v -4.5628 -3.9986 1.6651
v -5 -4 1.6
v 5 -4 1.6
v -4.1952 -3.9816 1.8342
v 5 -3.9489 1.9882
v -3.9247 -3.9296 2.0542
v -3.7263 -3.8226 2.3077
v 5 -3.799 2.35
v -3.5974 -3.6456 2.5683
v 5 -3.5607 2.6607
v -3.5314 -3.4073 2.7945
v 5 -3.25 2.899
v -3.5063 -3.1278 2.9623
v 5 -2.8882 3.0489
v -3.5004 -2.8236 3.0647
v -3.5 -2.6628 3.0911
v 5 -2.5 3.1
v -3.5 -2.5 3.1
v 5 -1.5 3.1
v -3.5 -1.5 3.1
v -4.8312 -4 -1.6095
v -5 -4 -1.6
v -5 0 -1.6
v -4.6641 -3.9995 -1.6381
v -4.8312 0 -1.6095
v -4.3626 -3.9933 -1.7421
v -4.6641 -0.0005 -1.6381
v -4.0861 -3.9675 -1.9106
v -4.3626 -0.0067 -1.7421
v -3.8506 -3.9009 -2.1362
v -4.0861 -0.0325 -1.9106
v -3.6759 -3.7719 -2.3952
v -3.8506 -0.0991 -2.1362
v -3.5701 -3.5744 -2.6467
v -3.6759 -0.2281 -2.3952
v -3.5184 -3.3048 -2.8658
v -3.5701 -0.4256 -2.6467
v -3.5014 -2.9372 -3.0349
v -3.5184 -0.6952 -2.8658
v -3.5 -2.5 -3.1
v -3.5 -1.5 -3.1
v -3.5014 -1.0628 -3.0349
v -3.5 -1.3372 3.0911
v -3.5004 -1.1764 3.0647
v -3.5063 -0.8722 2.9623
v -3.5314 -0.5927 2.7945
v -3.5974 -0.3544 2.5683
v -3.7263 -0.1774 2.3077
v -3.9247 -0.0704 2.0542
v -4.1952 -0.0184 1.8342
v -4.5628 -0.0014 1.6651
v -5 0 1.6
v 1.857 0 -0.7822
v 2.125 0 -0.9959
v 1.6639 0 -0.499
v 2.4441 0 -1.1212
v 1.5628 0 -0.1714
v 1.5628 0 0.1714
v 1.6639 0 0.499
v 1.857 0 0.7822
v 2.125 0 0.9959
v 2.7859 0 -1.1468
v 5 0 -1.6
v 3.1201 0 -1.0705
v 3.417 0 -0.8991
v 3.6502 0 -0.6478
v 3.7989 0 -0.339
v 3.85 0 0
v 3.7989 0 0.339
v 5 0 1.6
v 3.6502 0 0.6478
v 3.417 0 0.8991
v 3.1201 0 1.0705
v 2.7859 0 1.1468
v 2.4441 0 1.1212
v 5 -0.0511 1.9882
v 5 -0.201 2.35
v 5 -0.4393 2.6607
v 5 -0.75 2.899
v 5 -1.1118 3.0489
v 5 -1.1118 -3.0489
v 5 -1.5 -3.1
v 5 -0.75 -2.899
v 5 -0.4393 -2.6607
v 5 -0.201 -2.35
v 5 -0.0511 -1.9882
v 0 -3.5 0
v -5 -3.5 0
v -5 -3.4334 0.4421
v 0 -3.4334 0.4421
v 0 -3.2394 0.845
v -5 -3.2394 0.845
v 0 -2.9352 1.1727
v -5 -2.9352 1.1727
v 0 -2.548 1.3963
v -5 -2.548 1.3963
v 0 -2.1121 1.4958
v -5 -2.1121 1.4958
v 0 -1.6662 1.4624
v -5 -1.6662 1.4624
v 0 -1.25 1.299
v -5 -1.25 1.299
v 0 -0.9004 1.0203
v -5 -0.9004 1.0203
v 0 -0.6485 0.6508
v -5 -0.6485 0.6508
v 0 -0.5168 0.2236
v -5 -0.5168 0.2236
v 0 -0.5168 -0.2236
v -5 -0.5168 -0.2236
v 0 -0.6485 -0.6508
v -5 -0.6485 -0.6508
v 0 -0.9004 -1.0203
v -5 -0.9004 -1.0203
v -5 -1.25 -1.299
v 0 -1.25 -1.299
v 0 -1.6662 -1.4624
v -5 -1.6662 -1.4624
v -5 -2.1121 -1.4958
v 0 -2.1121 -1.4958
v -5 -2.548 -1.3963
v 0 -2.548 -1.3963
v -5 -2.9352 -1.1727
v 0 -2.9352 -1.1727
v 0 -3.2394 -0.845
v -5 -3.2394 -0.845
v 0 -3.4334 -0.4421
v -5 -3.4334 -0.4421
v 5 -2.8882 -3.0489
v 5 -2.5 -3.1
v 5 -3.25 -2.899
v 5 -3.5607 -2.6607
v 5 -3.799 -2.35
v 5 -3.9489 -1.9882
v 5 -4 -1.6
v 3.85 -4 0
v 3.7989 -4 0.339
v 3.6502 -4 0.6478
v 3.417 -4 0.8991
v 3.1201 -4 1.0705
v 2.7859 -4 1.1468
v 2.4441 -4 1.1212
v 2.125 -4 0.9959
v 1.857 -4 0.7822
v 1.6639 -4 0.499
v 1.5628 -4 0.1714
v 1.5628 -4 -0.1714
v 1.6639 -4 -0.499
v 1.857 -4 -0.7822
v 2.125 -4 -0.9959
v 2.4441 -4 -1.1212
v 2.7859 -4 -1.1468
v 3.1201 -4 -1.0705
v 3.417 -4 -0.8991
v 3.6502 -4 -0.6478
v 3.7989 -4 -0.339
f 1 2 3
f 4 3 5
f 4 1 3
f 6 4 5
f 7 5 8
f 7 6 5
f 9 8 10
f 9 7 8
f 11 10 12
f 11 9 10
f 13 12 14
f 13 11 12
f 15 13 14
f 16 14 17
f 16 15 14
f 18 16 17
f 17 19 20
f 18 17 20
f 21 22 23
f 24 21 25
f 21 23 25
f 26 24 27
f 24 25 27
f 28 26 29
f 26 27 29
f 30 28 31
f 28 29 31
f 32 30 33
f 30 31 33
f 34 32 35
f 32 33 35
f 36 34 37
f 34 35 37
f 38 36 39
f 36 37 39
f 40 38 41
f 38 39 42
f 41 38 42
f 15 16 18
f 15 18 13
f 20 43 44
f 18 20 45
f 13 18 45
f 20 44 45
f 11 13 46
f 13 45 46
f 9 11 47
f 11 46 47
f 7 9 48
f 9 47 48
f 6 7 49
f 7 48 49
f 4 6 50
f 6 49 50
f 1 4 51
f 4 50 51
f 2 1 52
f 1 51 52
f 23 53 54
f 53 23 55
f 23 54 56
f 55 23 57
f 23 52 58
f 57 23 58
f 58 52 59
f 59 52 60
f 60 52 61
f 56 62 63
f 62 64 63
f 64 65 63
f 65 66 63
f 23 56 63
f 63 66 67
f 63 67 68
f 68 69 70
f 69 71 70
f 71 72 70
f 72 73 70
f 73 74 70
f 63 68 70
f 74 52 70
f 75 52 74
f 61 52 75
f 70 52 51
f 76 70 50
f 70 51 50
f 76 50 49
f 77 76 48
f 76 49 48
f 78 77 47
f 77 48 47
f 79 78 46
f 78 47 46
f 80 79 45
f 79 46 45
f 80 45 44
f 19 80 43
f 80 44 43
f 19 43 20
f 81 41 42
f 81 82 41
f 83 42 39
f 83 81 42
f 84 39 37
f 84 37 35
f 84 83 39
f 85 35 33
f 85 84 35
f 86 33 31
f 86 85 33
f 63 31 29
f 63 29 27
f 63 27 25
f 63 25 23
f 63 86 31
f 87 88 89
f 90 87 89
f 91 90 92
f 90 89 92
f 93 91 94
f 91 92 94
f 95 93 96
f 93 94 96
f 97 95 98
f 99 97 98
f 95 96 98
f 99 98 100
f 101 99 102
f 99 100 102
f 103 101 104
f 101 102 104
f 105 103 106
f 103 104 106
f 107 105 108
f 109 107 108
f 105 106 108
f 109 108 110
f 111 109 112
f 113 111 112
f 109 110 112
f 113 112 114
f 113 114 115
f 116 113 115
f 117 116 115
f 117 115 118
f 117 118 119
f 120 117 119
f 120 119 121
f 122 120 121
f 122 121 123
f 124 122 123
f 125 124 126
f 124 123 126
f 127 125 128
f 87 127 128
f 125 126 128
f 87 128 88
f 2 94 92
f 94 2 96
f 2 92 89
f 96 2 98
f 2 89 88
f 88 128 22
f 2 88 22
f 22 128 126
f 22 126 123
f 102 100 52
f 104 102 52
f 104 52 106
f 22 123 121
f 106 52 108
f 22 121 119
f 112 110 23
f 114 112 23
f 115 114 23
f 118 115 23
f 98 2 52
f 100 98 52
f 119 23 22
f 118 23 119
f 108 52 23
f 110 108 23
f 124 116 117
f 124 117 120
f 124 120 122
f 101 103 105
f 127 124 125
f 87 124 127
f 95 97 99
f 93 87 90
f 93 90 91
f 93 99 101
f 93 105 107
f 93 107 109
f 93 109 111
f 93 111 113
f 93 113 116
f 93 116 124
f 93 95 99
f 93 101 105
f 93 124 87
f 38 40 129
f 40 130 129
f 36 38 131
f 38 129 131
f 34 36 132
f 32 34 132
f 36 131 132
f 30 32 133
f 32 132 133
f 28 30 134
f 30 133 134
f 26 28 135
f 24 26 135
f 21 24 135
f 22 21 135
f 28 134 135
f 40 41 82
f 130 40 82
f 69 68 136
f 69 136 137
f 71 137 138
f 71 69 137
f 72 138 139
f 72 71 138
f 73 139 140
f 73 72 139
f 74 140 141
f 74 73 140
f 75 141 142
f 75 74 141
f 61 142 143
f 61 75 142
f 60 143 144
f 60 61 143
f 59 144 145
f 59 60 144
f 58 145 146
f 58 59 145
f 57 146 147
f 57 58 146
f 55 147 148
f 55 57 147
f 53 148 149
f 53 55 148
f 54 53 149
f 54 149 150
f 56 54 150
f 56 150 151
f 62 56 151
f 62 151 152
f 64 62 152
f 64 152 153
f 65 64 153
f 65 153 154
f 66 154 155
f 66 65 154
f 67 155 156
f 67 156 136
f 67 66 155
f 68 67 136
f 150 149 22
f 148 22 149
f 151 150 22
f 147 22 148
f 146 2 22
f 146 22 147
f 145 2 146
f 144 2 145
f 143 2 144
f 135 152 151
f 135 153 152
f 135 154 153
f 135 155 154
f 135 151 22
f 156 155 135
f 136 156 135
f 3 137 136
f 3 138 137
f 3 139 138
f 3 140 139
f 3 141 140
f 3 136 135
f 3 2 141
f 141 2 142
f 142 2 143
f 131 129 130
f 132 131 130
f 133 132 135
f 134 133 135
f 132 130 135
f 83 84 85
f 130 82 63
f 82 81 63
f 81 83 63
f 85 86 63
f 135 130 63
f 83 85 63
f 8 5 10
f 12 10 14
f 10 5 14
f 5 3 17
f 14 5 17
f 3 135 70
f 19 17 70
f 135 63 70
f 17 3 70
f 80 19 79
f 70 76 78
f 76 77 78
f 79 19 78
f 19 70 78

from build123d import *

# Parameters (mm, degrees)
F0_R     = 1.15
F1_DEPTH = 4
F2_R     = 1.5
F3_DEPTH = 5
F4_R     = 1.5


with BuildPart() as f1:
    # F0 (on Front) → F1 (new body)
    with BuildSketch(Plane.XZ):
        with BuildLine():
            Line((-3.5, -3.1), (5, -3.1))
            Line((5, -3.1), (5, 3.1))
            Line((5, 3.1), (-3.5, 3.1))
            ThreePointArc((-3.5, 3.1), (-3.93934, 2.03934), (-5, 1.6))
            Line((-5, 1.6), (-5, -1.6))
            ThreePointArc((-5, -1.6), (-3.93934, -2.03934), (-3.5, -3.1))
        make_face()
        with Locations((2.7, 0)):
            Circle(F0_R, mode=Mode.SUBTRACT)
    extrude(amount=F1_DEPTH)

    # F2 (on face) → F3 (cut)
    with BuildSketch(Plane(origin=(-5, 0, 0), x_dir=(0, -1, 0), z_dir=(-1, 0, 0))):
        with Locations((2, 0)):
            Circle(F2_R)
    extrude(amount=-F3_DEPTH, mode=Mode.SUBTRACT)

    # F4
    f4_edges = [f1.edges().sort_by_distance(p)[0] for p in [
        (0.75, -4, -3.1),
        (0.75, -4, 3.1),
        (0.75, 0, -3.1),
        (0.75, 0, 3.1),
    ]]
    fillet(f4_edges, radius=F4_R)


solid = f1.part
